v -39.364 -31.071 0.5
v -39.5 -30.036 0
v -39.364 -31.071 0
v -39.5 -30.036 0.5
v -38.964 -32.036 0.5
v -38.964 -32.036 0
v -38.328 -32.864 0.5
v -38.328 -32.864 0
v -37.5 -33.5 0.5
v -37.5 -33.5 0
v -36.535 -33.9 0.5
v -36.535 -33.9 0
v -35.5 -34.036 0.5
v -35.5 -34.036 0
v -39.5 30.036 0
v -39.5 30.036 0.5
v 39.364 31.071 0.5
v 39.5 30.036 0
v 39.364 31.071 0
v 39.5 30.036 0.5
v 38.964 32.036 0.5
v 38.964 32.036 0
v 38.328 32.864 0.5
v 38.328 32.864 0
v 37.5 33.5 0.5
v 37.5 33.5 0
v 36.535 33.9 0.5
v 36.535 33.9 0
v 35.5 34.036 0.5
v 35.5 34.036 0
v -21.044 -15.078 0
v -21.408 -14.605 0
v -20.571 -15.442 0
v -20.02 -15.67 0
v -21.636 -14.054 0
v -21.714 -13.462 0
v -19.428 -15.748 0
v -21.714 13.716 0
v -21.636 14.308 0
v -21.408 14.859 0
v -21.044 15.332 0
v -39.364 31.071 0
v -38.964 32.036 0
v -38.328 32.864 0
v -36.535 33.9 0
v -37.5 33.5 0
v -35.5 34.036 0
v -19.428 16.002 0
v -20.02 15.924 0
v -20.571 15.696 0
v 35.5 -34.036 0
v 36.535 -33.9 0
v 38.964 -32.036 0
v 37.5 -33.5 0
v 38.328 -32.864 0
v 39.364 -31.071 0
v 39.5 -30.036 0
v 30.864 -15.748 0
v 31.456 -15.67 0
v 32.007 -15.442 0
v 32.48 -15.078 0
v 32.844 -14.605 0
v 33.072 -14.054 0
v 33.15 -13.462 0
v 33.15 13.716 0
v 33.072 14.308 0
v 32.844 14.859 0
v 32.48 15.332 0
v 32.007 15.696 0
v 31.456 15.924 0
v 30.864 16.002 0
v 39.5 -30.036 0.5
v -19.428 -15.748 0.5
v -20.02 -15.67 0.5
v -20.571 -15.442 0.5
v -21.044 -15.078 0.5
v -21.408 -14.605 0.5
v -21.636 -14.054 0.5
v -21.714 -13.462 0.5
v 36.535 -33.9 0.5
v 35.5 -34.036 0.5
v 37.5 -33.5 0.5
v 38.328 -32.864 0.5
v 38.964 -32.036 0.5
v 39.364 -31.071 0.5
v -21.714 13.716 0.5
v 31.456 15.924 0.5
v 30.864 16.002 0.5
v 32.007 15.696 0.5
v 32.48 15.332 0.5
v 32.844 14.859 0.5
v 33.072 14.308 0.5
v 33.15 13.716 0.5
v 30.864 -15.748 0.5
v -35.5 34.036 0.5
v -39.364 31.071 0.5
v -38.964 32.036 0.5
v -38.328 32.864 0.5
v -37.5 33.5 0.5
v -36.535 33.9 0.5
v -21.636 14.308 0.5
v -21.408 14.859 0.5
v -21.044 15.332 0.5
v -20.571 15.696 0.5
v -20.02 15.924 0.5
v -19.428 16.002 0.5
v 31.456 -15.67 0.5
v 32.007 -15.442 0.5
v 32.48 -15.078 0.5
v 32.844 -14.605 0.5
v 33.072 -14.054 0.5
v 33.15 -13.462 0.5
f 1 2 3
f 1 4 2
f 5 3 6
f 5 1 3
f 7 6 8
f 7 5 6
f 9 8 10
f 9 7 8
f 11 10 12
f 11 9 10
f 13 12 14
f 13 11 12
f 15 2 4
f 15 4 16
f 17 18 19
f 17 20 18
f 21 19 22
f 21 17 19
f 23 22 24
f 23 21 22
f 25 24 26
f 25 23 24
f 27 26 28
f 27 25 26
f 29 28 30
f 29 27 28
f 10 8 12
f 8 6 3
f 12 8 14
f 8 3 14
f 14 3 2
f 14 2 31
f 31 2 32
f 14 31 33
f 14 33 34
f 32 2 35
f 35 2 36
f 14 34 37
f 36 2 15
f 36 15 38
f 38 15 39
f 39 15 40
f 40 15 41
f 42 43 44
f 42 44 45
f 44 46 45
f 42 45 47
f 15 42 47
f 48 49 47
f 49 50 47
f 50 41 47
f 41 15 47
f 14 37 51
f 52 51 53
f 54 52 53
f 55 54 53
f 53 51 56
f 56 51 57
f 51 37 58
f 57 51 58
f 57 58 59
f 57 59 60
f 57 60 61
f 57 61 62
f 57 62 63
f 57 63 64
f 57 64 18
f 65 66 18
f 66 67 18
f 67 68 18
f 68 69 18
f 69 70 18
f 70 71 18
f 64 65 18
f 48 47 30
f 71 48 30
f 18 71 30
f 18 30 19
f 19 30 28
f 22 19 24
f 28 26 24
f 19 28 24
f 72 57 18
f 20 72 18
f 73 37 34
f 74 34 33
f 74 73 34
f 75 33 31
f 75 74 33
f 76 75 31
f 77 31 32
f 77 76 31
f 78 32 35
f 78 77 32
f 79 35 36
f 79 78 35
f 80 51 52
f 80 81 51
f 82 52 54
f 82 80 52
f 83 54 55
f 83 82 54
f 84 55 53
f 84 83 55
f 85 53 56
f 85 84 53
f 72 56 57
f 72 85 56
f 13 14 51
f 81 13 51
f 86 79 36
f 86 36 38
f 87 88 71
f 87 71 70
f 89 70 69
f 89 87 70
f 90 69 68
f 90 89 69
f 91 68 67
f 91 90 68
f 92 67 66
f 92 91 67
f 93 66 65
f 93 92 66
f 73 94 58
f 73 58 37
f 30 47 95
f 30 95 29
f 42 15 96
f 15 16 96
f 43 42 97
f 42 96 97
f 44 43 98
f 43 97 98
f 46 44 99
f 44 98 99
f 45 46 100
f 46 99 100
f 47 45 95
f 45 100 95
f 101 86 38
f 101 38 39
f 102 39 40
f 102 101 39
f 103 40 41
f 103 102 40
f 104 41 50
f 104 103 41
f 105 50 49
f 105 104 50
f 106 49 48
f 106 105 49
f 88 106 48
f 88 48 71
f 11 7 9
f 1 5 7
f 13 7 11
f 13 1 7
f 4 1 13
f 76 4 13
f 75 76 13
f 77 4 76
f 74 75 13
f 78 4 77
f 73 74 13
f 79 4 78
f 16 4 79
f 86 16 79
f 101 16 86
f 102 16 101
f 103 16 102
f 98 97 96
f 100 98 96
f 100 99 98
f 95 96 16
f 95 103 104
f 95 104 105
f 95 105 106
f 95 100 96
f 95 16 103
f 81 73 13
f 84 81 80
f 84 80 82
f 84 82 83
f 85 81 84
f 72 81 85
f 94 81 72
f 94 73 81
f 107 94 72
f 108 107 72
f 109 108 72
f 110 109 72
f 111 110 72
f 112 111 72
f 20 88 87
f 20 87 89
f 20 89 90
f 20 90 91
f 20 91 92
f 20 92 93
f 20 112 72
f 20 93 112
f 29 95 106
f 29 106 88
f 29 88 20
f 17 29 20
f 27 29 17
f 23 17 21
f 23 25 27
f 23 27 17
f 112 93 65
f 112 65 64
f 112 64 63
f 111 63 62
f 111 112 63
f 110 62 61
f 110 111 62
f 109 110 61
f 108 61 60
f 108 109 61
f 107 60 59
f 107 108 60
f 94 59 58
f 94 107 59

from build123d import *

# Parameters (mm, degrees)
SKETCH1_W           = 79
SKETCH1_H           = 68.072
BOSS_EXTRUDE1_DEPTH = 0.5
FILLET1_R           = 4
CUT_EXTRUDE1_DEPTH  = 53.143545104


with BuildPart() as part:
    # Sketch1 → Boss-Extrude1 (new body)
    with BuildSketch(Plane.XY):
        Rectangle(SKETCH1_W, SKETCH1_H)
    extrude(amount=BOSS_EXTRUDE1_DEPTH)

    # Fillet1
    fillet1_edges = [part.edges().sort_by_distance(p)[0] for p in [
        (-39.5, 34.036, 0.25),
        (39.5, 34.036, 0.25),
        (39.5, -34.036, 0.25),
        (-39.5, -34.036, 0.25),
    ]]
    fillet(fillet1_edges, radius=FILLET1_R)

    # Sketch2 → Cut-Extrude1 (cut, through all)
    with BuildSketch(Plane.XY.offset(0.5)):
        with BuildLine():
            Line((-19.428, 16.002), (30.864, 16.002))
            ThreePointArc((30.864, 16.002), (32.480446102, 15.332446102), (33.15, 13.716))
            Line((33.15, 13.716), (33.15, -13.462))
            ThreePointArc((33.15, -13.462), (32.480446102, -15.078446102), (30.864, -15.748))
            Line((30.864, -15.748), (-19.428, -15.748))
            ThreePointArc((-19.428, -15.748), (-21.044446102, -15.078446102), (-21.714, -13.462))
            Line((-21.714, -13.462), (-21.714, 13.716))
            ThreePointArc((-21.714, 13.716), (-21.044446102, 15.332446102), (-19.428, 16.002))
        make_face()
    extrude(amount=-CUT_EXTRUDE1_DEPTH, mode=Mode.SUBTRACT)


solid = part.part
